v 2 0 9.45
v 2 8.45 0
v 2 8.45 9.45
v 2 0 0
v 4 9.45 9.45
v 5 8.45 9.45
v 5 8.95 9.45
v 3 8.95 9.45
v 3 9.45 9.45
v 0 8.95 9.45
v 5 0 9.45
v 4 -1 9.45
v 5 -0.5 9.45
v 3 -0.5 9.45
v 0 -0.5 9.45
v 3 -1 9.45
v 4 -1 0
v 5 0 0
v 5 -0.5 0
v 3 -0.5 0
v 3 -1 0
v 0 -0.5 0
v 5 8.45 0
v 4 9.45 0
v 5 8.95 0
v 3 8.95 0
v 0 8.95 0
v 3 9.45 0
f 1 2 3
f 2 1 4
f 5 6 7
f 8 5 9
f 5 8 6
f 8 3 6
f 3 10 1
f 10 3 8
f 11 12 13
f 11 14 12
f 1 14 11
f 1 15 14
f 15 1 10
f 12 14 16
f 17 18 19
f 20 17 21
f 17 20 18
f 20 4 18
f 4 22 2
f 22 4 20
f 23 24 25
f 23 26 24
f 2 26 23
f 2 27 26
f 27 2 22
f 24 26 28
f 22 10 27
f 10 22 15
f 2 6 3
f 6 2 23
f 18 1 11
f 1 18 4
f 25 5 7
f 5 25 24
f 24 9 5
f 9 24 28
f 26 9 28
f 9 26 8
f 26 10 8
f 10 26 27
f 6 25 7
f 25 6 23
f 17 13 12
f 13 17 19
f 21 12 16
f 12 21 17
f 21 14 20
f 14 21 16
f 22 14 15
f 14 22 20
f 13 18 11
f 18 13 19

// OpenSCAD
// file: ../lib/hull.scad
/*
hull.scad - a library that leverages the hull() procedure
Author: Elliot Williams
github: https://gist.github.com/hexagon5un )
source: https://gist.github.com/hexagon5un/73e187dfa0404c69177795424f397ce6#file-hull-scad

Featured in the hackaday atricle: 'OPENSCAD: TIEING IT TOGETHER WITH HULL()'
https://hackaday.com/2018/02/13/openscad-tieing-it-together-with-hull/
*/
module multiHull(){
	for (i = [1 : $children-1])
		hull(){
			children(0);
			children(i);
		}
}

module sequentialHull(){
	for (i = [0: $children-2])
		hull(){
			children(i);
			children(i+1);
		}
}

/* Extended fun hull functions */ 

module cylinders(points, diameter, thickness){
	for (p=points){
		translate(p) cylinder(d=diameter, h=thickness, center=true);
	}
}

module plate(points, diameter, thickness, hole_diameter){
	difference(){
		hull() cylinders(points, diameter, thickness);
		cylinders(points, hole_diameter, 1000);
	}
}

module bar(length, width, thickness, hole_diameter){
	plate([[0,0,0], [length,0,0]], width, thickness, hole_diameter);
}

module rounded_box(points, radius, height, facets=30){
	hull(){
		for (p = points){
			translate(p)
				cylinder(r=radius, h=height, $fn=facets);
		}
	}
}

module point_cloud(points, radius=1, facets=8){
	for (p=points){
		translate(p)
			sphere(radius/cos(180/facets), $fn=facets);
		// polygon sphere circumscribed on radius
	}
}

module point_hull(points, radius=1, facets=8){
	hull(){
		point_cloud(points, radius, facets);
	}
}

// Shrink the exterior of the points so that the hull fits inside
function select(vector, i) = [ for (p=vector) p[i] ];
function axis_center(v, i) = (max(select(v, i)) - min(select(v,i)))/2;
function center(v) = [ for (i = [0,1,2]) axis_center(v, i) ];
function shrink_point(point, center, radius) = [ for (i = [0,1,2]) point[i] > center[i] ? point[i] - radius : point[i] + radius ]; 
function shrink(points, radius) = [ for (p = points) shrink_point(p, center(points), radius) ];

module interior_point_hull(points, radius=1){
	point_hull(shrink(points, radius), radius);
}

module interior_rounded_box(points, radius, height){
	rounded_box(shrink(points, radius), radius, height);
}


module mirror_copy(v = [1, 0, 0]) {
    children();
    mirror(v) children();
}
// file: ../lib/basics.scad
///< Basics module
use <math.scad>;
use <utils.scad>;
use <hull.scad>;

module triangle( w, d, h ){
     difference(){
	  hyp = hyp_from_sides( d, h );
	  color( "red" )cube( [w, d, h] );
	  rotate( [ 45, 0, 0 ] )
	       translate( [ -0.01, 0, 0 ] )
	       color( "green" )cube( [w+0.2, hyp, h] );
     }
}

module tri_xy(pt1, pt2, pt3, h=1) {
     color( rands( 0,1,3 ) ) linear_extrude( height=h )
	  polygon( points=[ pt1, pt2, pt3 ] );
}

module triangle_xy( pts, h=1) {
     color( rands( 0,1,3 ) ) linear_extrude( height=h )
	  polygon( points = pts );
}

module oval(w,l, height, center = false, fn = 30) {
 scale([1, l/w, 1]) cylinder(h=height, r=w, center=center, $fn = fn);
}

module pipe( outer, inner, height, fn = 60 ){
     offset_percent = 0.25;
     inner_h = height + (offset_percent * 2 );
     difference(){
     ///< Debug with union(){
	  cylinder(r=outer, h = height, $fn = fn );
	  translate([0,0,-offset_percent]){
	       color("green",0.5)cylinder(r=inner, h = inner_h, $fn = fn );
	  }
     }
}

module rounded_pipe( r, h, fn = 60 ){
     cylinder(r = r, h = h, $fn = fn );

     color("blue")
     translate([0,0,h])
	  sphere(r, $fn = fn );

     color("red")
     translate([0,0,0])
	  sphere(r, $fn = fn );
}

/// Stackoverflow example module for a line
/// https://stackoverflow.com/questions/49533350/is-that-possible-to-draw-a-line-using-openscad-by-joining-different-points
module line(start, end, thickness = 1, fn = 30) {
    hull() {
	translate(start) sphere(thickness, $fn = fn);
	translate(end) sphere(thickness, $fn = fn);
    }
}


/*
Hulled box:

Parameterized box with rounded corners. This uses the hull.scad
to hull four cylinders around four point in space. This variation
offsets the box to zero/zero and takes in w,d,h to mesh better
with tuples.
*/
module hulled_cube( w, d, h, r = 1 ){
    points = [
	[ 0, 0, 0 ],
	[ w, 0, 0 ],
	[ 0, w, 0 ],
	[ w, w, 0 ],
	];
    resize( [w,d,h]){
	translate( [r, r,0] ){
	    rounded_box( points, radius = r, height=h );
	}
    }
}
// file: ../lib/cantilever.scad
///< Object definition
use <../lib/math.scad>;
use <../lib/utils.scad>;
use <../lib/basics.scad>;

/*
http://fab.cba.mit.edu/classes/S62.12/people/vernelle.noel/Plastic_Snap_fit_design.pdf

Parameters
y= (permissible) deflection (=undercut)
l= length of arm
h= thickness at root
b= width at root
c= distance between outer fiber and neutral fiber (center of gravity)
P= (permissible) deflection force
a= hypot of deflection
*/

thickness = 6.5;

module cantilever( y, h, b, p, a, l = 1, origin = 0, hide = false ){
       points = [
       [ origin,             origin],
       [ origin,             h     ],
       [ origin + b,         h     ],
       [ origin + b,         h + y ],
       [ origin + b + p,     h + y ],
       [ origin + b + p + a, h     ],
       [ origin + b + p + a, origin],
       ];
     if( !hide ){
     linear_extrude( height = l ){ polygon( points ); }
     }
}

module substrate( y, h, b, p, a, l = 1, origin = [0,0], hide = false, sep = 0.25, suby = 1, subx = 0 ){

     points = [
       [ origin[0],                       h + y ],           //< A
       [ origin[0],                       h + y + suby ],    //< B
       [ origin[0] + b + p + a + subx,    h + y + suby ],    //< C
       [ origin[0] + b + p + a + subx,    origin[1] + sep ], //< D
       [ origin[0] + b + p + a + subx,    origin[1] + sep ], //< E
       [ origin[0] + b + p + a + subx,    h + sep ],         //< F
       [ origin[0] + b + p,               h + sep + y ],     //< G
       [ origin[0] + b,                   h + sep + y ],     //< H
       [ origin[0] + b - a,               h + sep ],         //< I
       [ origin[0] + a,                   h + sep ],         //< J
       ];
     if( !hide ){
     linear_extrude( height = l ){ polygon( points ); }
     }
}

module snap_fit_sub( y, h, b, p, a, l = 1, origin = 0, hide = false, sep = 0, suby = 0, subx = 0, hide_sub = false, hide_lever = false ){

     color( "violet")cantilever( y = y, h = h, b = b, p = p, a = a, l = l, hide = hide_lever );
     color( "pink" )substrate(   y = y, h = h, b = b, p = p, a = a, l = l, sep = sep, suby = suby, subx = subx, hide = hide_sub, origin = [ sep, 0 ] );
}


module snap_fit_anchor( y, h, b, p, a, l = 1, origin = [0,0], hide = false, sep = 0, suby = 0, subx = 0, hide_sub = false, hide_lever = false ){

  color( "violet")cantilever( y = y, h = h, b = b, p = p, a = a, l = l, hide = hide_lever );
  color( "pink" )substrate(   y = y, h = h, b = b, p = p, a = a, l = l, sep = sep, suby = suby, subx = subx, hide = hide_sub, origin = [ sep, 0 ] );
 
  cube_w = h+y;
  cube_h = h+y+sep+suby+sep;
  translate( [-(h+y),0,0] )cube( [ cube_w, cube_h, l ] );

}


translate( [ 0, 8, 0 ] )cantilever(y = 1, h = 1-0.1, b = 6, p = 2, a = 2 );

snap_fit_sub( y = 1, h = 1-0.1, b = 6, p = 2, a = 2, sep = 0.1, suby = 0.1, subx = 0 );

translate( [ 0, 3, 0 ] )snap_fit_sub( y = 0.5, h = 0.5-0.1, b = 3, p = 0.5, a = 1, l = 3, sep = 0.1, suby = 1, subx = 0.25 );


translate( [ 0, 5, 0 ] )snap_fit_anchor( y = 0.5, h = 0.5-0.1, b = 3, p = 0.5, a = 1, l = 3, sep = 0.1, suby = 1, subx = 0.25 );
// file: ../lib/utils.scad
///< Utilities

function rand_clr() = rands( 0,1,3 );

///< Length conversions
function in2mm( i ) = ( i * 25.4 ); 
function mm2in( m ) = ( m / 25.4 );

/// This is pulled from stackoverflow
/// https://stackoverflow.com/questions/45826208/openscad-rotating-around-a-particular-point

// rotate as per a, v, but around point pt
module rotate_about_pt(a, v, pt) {
    translate(pt)
        rotate(a,v)
            translate(-pt)
                children();   
}
// file: ../lib/math.scad
///< Math scad module


///< Find the hypotenuse from two sides of a right triangle
function hyp_from_sides( a, b ) = sqrt( pow( a, 2 ) + pow( b, 2 ) );

///< Find equal sides from hypotenuse of a right triangle
function sides_from_hyp(h) = sqrt( pow( h, 2 ) / 2 );

///< Find A from hypotenuse and B
function a_from_hb( h, b ) = sqrt( pow( h, 2 ) - pow( b, 2 ) );

function dist_2d( pt2, pt1 ) = sqrt(pow(( pt2[0]-pt1[0] ),2) + pow(( pt2[1]-pt1[1]),2) );

function mid_pt_2d( pt2, pt1 ) = [( pt1[0]+pt2[0] )/2, ( pt1[1]+pt2[1] )/2, 0 ];
///< Test for math functions

A = 3;
B = 4;
echo("Given A=", A, "and B=", B );
H = hyp_from_sides( A, B );
echo("Hypotenuse=", H );
echo("Calc Correct = ", (H == 5) );

echo("Given H=", H, " which is a hypotenuse with equal sides" );
echo( "the sides=", sides_from_hyp( H ) );

echo("Given H=", H, "B=", 4 );
echo("A=", a_from_hb( H, 4 ) );

echo("Distance from [-1,1] and [3,4] = ", dist_2d( [-1,1],[3,4]) );
// main file
///< Object definition
use <../lib/math.scad>;
use <../lib/utils.scad>;
use <../lib/cantilever.scad>;

///< Parameters
r = 5.00;
w = 25.72 - r;
d = 10;
h = 38.50;

///< Rubber pad
pad_w = 18.50;
pad_d =  1.00;
pad_h = 34.10;
pad_offset = 2.00;

///< Dock
dock_wall_thickness = 1.0;
dock_w = w + dock_wall_thickness * 2 + r;
dock_d = d + dock_wall_thickness * 2;
dock_h = h + dock_wall_thickness * 2;

///< Modules
module kvm_switch( width, depth, height, radius,
		   pad_w, pad_d, pad_h,  pad_o ){
  translate( [ radius, 0 , 0 ] ){
  color( "lime" )
    cube( [width, depth, height] );
  color( "cyan" )
    translate( [ 0, radius, 0 ] )
    cylinder( h = height, r=radius, $fn=60 );

  /// Rubber pad
  color( "pink" )
    translate( [ 0, depth,pad_o ] )
    cube( [ pad_w, pad_d, pad_h ] );
  }
}

module kvm_dock_substrate( width, depth, height, round_r = 1 ) {
     rot = [ 0, 0, 0 ];
     points = [
	  [ 0,         0, 0 ],
	  [ 0,     depth, 0 ],
	  [ width, depth, 0 ],
	  [ width,     0, 0 ],
	  ];
     color( "orange" )
     hull(){
     for( p = points ){
	  translate( p ) rotate( rot )cylinder( r = round_r, h=h, $fn = 60 );
     }
     cube( [ width, depth, 1 ] );
   }
}

module kvm_dock(){
     difference(){
	  ///< Build kvm switch
	  kvm_dock_substrate( dock_w, dock_d, dock_h );

	  ///< Build kvm_switch
	  translate( [ dock_wall_thickness, -dock_wall_thickness, dock_wall_thickness * 2.5 ] )
	       kvm_switch( w, d, h, r, pad_w, pad_d, pad_h, pad_offset );
     }
}

module snap_joint( w, h, c ){
     wo = w - c;
     p  = w * 0.70;
     d2 = 0.90;
     $fn = 90;
     points = [
	  [ 0,  0     ],
	  [ 0,  h     ],
	  [ wo, h     ],
	  [ w,  h-c   ],
	  [ w,  h-c*2 ],
	  [ wo, h-c*3 ],
	  [ p,  h-c*3 ],
	  [ p,  0     ],
	  ];

     inner_points = [
	  [ 0,        0       ],
	  [ 0,     h*d2       ],
	  [ wo*d2, h*d2       ],
	  [ w*d2,  (h-c)*d2   ],
	  [ w*d2,  (h-c*2)*d2 ],
	  [ wo*d2, (h-c*3)*d2 ],
	  [ p*d2,  (h-c*3)*d2 ],
	  [ p*d2,  0          ],
	  ];


     difference(){
	  rotate_extrude()
	       polygon( points );

	  translate( [ 0, 0, h-h*d2+0.1 ] )
	       color( "red" )
	       rotate_extrude()
	       polygon( inner_points );
     }
}

//kvm_dock();
hole_w = 9.45;
clip_h = 0.5; ///< Cantilever thickness
clip_b = 3;
clip_a = 1;
clip_y = 0.5;
clip_p = 1;
clip_l = hole_w;
span = hole_w - clip_h * 2;

cube( [ 2, span, hole_w ] );
translate( [ 0, span, 0 ] )cantilever(y = clip_y, h = clip_h, b = clip_b, p = clip_p, a = clip_a, l = clip_l );
mirror( [0,1,0] )
cantilever(y = clip_y, h = clip_h, b = clip_b, p = clip_p, a = clip_a, l = clip_l );

///< Snap button
//translate( [ dock_w/2, dock_d+1, dock_h/2 ] )rotate( [ -90, 0 , 0 ] )
//snap_joint( w = 5, h = 2, c = 0.5 );
